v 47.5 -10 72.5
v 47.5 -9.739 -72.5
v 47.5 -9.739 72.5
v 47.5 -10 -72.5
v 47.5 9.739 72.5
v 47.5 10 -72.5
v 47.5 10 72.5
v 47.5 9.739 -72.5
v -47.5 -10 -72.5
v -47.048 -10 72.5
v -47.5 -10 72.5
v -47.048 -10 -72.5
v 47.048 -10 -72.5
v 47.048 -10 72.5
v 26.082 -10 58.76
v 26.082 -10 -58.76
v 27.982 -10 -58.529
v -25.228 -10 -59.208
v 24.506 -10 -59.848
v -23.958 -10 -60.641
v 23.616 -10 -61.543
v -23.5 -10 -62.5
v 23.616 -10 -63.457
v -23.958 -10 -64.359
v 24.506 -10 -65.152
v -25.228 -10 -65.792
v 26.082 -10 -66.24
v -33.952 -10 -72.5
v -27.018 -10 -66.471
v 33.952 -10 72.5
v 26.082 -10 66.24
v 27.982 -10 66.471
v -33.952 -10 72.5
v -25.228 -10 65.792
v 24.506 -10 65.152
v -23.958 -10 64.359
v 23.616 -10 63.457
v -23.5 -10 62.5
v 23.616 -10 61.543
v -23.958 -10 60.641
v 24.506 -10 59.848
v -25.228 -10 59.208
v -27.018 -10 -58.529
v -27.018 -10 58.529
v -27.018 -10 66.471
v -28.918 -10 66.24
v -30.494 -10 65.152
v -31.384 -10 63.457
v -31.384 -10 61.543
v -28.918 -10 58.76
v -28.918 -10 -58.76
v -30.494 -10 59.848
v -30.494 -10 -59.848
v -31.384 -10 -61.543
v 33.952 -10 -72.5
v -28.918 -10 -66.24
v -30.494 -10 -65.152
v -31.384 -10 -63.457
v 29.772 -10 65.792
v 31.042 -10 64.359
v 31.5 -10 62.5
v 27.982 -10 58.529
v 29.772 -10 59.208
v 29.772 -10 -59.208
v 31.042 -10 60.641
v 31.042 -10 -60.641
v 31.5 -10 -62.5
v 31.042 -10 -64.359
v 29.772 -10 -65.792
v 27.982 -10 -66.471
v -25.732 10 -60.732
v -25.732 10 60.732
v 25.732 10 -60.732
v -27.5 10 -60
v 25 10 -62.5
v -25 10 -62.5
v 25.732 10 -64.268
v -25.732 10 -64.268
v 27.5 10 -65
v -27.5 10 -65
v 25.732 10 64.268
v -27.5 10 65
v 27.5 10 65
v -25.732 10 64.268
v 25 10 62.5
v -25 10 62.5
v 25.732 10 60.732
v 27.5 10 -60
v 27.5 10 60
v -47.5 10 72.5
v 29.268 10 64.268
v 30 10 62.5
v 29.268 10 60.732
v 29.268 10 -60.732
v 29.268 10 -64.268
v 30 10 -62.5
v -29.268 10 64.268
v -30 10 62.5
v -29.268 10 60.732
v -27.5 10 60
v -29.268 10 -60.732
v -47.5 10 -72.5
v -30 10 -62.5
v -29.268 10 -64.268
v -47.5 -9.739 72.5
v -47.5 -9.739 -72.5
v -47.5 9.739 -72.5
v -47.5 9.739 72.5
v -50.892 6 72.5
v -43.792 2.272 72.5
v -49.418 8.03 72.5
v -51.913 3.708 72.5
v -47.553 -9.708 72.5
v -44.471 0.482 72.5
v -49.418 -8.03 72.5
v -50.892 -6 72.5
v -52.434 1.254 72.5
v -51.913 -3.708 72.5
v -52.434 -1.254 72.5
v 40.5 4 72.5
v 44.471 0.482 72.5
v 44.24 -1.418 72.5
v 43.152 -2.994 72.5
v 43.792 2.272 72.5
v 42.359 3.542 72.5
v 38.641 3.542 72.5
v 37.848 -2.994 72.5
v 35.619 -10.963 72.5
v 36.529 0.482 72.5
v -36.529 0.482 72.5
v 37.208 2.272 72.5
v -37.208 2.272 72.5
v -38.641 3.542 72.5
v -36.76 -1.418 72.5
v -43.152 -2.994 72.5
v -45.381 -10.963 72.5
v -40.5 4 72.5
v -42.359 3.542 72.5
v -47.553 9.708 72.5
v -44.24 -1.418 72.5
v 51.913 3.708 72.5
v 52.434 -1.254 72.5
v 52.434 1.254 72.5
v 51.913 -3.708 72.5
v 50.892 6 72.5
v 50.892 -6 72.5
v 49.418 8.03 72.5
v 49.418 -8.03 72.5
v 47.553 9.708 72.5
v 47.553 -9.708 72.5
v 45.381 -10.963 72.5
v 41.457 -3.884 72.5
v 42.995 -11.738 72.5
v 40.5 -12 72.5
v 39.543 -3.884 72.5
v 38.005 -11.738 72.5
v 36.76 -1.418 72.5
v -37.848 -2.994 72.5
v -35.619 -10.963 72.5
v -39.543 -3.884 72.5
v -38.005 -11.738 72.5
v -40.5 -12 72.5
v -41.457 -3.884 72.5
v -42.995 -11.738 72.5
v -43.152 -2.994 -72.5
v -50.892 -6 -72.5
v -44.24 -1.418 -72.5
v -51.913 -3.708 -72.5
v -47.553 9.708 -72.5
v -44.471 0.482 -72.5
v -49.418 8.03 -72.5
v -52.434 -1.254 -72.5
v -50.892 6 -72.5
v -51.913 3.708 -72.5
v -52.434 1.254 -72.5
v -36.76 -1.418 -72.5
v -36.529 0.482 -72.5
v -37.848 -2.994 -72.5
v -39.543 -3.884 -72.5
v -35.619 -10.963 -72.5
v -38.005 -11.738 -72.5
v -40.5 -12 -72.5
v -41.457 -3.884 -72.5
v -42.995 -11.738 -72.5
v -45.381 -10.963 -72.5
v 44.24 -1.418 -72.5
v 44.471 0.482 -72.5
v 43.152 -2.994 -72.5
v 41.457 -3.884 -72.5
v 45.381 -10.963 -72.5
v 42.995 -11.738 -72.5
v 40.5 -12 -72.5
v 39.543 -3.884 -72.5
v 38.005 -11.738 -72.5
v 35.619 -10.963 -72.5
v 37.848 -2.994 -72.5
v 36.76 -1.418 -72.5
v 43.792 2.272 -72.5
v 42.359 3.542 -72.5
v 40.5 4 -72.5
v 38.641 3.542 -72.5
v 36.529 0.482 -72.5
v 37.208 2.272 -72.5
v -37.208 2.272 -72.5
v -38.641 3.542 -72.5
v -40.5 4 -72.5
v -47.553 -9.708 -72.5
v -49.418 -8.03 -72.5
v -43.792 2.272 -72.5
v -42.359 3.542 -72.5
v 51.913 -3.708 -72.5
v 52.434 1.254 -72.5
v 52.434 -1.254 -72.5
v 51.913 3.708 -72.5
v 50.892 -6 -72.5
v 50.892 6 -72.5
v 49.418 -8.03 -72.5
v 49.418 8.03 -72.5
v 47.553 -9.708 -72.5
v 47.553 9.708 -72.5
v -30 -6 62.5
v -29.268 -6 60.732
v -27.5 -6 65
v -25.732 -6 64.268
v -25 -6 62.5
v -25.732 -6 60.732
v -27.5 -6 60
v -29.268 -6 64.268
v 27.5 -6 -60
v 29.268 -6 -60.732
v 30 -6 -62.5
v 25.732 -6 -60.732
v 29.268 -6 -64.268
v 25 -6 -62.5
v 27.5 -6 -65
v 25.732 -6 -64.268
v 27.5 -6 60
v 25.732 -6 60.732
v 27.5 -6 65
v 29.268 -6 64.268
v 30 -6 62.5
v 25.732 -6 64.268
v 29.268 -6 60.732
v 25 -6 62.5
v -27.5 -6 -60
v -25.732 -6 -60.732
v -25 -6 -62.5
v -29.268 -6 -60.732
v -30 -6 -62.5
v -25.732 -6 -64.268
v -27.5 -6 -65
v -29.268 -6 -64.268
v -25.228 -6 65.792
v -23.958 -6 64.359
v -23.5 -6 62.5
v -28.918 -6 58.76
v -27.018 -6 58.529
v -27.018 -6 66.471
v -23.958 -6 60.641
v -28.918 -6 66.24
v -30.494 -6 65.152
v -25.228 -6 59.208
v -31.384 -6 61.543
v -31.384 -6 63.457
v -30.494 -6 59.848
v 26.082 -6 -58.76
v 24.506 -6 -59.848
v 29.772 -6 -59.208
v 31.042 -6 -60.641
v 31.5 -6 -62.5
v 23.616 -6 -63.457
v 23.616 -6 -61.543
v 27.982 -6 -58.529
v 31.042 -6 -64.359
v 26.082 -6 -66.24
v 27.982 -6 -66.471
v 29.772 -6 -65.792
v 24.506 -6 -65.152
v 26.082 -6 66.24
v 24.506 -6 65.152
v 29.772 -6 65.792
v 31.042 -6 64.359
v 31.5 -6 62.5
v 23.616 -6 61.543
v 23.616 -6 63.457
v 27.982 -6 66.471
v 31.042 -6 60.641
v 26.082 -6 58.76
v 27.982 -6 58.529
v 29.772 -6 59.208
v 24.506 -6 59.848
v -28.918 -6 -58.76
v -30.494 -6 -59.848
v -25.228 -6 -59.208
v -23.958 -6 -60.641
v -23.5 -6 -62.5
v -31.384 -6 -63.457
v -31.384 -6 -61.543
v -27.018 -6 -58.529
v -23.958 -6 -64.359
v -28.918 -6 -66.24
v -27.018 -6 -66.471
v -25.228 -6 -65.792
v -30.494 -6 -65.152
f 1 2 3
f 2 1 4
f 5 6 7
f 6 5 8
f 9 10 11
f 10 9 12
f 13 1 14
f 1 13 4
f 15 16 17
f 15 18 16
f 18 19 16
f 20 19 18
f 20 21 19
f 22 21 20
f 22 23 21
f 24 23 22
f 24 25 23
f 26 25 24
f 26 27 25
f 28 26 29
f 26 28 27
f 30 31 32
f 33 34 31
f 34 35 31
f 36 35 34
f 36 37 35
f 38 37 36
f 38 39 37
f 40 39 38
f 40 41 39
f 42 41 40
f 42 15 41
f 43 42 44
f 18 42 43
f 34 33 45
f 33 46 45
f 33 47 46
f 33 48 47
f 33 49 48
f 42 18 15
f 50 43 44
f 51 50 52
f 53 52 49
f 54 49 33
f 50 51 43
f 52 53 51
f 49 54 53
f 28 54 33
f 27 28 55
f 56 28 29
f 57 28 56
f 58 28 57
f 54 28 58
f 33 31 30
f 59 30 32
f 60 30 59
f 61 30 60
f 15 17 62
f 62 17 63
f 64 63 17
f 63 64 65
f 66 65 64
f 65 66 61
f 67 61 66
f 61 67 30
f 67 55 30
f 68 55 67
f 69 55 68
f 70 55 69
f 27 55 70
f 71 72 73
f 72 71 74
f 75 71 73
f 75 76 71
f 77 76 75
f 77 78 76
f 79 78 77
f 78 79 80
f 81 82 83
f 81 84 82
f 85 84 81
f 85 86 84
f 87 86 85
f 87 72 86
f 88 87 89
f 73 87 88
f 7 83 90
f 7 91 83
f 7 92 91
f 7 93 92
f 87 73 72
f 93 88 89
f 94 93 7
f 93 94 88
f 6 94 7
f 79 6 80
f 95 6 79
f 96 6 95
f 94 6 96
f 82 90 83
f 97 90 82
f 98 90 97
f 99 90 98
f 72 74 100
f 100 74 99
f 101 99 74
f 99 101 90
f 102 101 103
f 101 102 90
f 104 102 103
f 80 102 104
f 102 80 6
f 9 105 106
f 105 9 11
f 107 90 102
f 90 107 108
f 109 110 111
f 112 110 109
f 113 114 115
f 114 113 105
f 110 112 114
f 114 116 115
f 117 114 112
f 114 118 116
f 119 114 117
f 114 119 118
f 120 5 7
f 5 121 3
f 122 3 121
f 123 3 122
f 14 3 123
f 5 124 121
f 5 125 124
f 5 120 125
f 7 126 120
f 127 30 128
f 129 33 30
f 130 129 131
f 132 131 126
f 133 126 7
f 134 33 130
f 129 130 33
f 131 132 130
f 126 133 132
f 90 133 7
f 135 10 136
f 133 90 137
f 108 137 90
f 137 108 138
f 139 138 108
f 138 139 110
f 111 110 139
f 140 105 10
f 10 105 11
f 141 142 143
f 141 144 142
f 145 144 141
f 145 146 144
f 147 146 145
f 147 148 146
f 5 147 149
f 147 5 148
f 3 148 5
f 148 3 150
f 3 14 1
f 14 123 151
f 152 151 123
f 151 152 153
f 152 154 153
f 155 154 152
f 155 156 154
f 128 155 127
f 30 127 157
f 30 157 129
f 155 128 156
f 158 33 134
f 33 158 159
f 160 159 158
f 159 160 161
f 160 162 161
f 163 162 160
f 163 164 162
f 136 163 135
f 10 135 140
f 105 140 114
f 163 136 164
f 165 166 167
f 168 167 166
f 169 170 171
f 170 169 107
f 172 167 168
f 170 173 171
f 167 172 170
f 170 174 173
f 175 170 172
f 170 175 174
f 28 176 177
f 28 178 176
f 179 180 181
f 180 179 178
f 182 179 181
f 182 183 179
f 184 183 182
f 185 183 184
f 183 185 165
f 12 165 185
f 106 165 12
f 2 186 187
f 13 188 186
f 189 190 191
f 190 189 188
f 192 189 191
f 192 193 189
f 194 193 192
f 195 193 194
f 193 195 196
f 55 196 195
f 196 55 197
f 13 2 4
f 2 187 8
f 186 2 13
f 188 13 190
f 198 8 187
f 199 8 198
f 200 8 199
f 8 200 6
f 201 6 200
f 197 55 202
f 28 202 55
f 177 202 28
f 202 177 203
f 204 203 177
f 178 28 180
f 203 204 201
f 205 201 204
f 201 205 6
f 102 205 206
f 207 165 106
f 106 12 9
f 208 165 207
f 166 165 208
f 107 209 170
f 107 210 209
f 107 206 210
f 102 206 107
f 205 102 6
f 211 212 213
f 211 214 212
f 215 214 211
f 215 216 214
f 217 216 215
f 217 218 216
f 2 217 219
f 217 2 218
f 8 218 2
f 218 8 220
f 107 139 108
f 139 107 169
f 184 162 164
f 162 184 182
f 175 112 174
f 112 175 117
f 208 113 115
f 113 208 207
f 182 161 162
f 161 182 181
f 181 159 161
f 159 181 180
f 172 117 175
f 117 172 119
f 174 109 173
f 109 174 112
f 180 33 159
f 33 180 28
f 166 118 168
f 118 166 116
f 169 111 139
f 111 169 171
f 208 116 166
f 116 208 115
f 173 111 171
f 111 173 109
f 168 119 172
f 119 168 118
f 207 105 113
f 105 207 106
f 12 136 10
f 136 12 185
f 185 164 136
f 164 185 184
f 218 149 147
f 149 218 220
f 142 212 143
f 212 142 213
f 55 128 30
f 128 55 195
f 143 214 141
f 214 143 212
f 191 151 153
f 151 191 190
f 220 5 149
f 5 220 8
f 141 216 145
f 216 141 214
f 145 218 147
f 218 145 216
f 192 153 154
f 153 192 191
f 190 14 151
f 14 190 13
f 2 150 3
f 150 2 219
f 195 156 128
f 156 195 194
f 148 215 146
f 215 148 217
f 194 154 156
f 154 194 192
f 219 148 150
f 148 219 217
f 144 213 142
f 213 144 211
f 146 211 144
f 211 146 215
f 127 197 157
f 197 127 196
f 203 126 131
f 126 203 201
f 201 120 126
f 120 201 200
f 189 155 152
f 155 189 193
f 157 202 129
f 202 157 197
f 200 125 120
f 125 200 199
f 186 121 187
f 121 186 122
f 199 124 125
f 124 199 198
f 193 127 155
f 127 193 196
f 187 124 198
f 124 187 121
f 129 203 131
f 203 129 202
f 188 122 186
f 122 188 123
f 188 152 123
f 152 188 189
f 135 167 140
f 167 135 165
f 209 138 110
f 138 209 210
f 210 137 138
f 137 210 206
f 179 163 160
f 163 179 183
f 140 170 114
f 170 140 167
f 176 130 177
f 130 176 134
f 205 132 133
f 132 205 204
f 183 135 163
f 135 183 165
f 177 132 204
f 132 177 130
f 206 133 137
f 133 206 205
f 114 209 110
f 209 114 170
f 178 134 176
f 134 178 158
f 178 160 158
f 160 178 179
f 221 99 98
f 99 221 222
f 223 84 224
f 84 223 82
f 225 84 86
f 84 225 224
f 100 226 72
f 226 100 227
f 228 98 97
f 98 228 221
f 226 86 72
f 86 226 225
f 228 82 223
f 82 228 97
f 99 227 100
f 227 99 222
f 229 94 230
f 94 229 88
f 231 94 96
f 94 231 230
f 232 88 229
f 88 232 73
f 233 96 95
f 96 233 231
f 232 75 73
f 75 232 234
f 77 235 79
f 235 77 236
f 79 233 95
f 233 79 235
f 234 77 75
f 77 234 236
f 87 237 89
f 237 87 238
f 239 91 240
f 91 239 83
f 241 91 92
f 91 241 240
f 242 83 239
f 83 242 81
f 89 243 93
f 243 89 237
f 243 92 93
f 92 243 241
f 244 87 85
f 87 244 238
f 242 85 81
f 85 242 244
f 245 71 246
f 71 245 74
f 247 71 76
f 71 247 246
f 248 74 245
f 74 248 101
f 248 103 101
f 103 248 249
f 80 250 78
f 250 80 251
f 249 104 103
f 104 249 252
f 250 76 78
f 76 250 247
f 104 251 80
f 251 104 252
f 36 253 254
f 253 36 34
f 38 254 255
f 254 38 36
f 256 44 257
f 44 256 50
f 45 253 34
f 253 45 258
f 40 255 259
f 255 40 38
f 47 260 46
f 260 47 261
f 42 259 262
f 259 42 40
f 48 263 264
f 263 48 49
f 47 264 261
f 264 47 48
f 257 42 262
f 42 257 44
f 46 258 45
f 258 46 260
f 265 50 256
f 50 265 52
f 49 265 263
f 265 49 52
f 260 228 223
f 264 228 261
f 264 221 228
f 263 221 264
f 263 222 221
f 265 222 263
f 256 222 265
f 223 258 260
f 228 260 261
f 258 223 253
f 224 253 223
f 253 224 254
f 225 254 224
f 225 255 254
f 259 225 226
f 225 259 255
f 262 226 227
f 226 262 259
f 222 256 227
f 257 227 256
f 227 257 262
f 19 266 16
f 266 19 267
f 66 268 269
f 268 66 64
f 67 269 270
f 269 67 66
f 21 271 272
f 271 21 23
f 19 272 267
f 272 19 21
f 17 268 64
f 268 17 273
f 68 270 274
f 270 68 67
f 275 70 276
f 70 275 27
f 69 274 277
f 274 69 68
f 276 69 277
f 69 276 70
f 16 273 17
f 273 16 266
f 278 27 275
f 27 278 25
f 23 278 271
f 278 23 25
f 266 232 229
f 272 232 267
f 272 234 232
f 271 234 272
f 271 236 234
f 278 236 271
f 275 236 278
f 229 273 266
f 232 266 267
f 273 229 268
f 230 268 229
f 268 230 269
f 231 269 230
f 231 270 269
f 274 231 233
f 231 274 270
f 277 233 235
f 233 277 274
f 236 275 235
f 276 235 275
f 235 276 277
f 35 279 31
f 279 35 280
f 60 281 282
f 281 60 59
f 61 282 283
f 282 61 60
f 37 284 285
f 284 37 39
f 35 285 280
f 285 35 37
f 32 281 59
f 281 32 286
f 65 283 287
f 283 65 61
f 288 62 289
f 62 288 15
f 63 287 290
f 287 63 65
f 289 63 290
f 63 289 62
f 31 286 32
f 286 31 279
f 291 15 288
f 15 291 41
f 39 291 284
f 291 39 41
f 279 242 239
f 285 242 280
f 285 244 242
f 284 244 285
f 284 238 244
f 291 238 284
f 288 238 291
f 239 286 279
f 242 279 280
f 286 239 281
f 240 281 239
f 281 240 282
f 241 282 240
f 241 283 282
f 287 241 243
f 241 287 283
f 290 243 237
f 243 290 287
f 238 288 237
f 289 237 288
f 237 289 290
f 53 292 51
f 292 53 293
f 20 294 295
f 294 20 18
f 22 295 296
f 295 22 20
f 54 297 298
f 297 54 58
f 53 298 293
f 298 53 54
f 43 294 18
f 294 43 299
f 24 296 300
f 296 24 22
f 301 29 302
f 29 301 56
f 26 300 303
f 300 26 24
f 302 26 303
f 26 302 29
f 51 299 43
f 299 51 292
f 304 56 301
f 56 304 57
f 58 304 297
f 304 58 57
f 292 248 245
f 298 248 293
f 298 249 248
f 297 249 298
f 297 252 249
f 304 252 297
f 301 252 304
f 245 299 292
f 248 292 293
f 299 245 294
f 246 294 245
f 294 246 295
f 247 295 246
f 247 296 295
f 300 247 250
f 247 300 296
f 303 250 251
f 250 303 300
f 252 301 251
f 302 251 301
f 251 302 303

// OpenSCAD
difference(){
 rotate(a=[90,0,0]){
  difference(){
   union(){
    cube([95,145,20], center=true);
    translate([(-95/2)+7,0,0]){
     rotate(a=[0,90,90]){
      cylinder(h = 145, r=12,center=true);
     }
    }
    translate([(95/2)-7,0,0]){
     rotate(a=[0,90,90]){
      cylinder(h = 145, r=12,center=true);
     }
    }
   }
   union(){
    translate([(95/2)-7,0,0]){
     rotate(a=[0,90,90]){
      cylinder(h = 200, r=4,center=true);
     }
    }
    translate([(-95/2)+7,0,0]){
     rotate(a=[0,90,90]){
      cylinder(h = 200, r=4,center=true);
     }
    }
    translate([(-55/2),125/2,0]){
     cylinder(h = 200, r=2.5,center=true);
    }
    translate([(55/2),-125/2,0]){
     cylinder(h = 200, r=2.5,center=true);
    }
    translate([(55/2),125/2,0]){
     cylinder(h = 200, r=2.5,center=true);
    }
    translate([(-55/2),-125/2,0]){
     cylinder(h = 200, r=2.5,center=true);
    }
    translate([(-55/2),125/2,6]){
     cylinder(h = 5, r=4);
    }
    translate([(55/2),-125/2,6]){
     cylinder(h = 5, r=4);
    }
    translate([(55/2),125/2,6]){
     cylinder(h = 5, r=4);
    }
    translate([(-55/2),-125/2,6]){
     cylinder(h = 5, r=4);
    }
   }
  }
 }
 translate([0,100/2+10,0]){
  cube([100,100,200],center=true);
 }
}
